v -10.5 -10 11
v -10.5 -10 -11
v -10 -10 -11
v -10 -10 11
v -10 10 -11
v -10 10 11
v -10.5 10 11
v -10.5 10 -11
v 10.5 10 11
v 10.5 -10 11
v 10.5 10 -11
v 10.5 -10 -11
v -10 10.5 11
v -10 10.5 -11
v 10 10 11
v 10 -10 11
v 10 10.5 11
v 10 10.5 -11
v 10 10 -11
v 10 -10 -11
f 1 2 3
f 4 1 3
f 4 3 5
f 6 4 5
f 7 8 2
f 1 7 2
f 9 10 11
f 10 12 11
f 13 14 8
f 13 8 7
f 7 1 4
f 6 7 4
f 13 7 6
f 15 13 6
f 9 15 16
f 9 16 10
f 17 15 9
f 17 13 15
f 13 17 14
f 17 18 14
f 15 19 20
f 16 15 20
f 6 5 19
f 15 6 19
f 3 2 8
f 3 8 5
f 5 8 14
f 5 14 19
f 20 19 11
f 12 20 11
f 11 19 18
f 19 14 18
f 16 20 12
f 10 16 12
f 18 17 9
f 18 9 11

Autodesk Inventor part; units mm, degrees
ref_plane "YZ Plane" through (0, 0, 0) normal (1, 0, 0) x (0, 1, 0)
ref_plane "XZ Plane" through (0, 0, 0) normal (0, 1, 0) x (-1, 0, 0)
ref_plane "XY Plane" through (0, 0, 0) normal (0, 0, 1) x (1, 0, 0)
sketch "Sketch1" plane through (0, 0, 0) normal (0, 0, 1) x (1, 0, 0)
  line L0 (10, -10) -> (-10, -10)
  line L1 (-10, -10) -> (-10, 10)
  line L2 (-10, 10) -> (10, 10)
  line L3 (10, 10) -> (10, -10)
  line L4 (10, -10) -> (-10, 10) construction
  line L5 (-10, -10) -> (10, 10) construction
  line L6 (10.5, 10.5) -> (-10.5, 10.5)
  line L7 (-10.5, 10.5) -> (-10.5, -10.5)
  line L8 (-10.5, -10.5) -> (10.5, -10.5)
  line L9 (10.5, -10.5) -> (10.5, 10.5)
  line L10 (-10.5, -10) -> (10.5, -10)
  point P0 (0, 0)
  dimension "d0" = 20
  dimension "d1" = 20
  dimension "d2" = 0.5
extrude "Extrusion1" add sketch "Sketch1" along normal mid plane 22 contours L3 L2 L1 L10 L7 L6 L9
chamfer "Chamfer1" distance 0.5 angle 45 2 edges at (10.5, 10.5, 0) (-10.5, 10.5, 0)
properties part number "cover"
